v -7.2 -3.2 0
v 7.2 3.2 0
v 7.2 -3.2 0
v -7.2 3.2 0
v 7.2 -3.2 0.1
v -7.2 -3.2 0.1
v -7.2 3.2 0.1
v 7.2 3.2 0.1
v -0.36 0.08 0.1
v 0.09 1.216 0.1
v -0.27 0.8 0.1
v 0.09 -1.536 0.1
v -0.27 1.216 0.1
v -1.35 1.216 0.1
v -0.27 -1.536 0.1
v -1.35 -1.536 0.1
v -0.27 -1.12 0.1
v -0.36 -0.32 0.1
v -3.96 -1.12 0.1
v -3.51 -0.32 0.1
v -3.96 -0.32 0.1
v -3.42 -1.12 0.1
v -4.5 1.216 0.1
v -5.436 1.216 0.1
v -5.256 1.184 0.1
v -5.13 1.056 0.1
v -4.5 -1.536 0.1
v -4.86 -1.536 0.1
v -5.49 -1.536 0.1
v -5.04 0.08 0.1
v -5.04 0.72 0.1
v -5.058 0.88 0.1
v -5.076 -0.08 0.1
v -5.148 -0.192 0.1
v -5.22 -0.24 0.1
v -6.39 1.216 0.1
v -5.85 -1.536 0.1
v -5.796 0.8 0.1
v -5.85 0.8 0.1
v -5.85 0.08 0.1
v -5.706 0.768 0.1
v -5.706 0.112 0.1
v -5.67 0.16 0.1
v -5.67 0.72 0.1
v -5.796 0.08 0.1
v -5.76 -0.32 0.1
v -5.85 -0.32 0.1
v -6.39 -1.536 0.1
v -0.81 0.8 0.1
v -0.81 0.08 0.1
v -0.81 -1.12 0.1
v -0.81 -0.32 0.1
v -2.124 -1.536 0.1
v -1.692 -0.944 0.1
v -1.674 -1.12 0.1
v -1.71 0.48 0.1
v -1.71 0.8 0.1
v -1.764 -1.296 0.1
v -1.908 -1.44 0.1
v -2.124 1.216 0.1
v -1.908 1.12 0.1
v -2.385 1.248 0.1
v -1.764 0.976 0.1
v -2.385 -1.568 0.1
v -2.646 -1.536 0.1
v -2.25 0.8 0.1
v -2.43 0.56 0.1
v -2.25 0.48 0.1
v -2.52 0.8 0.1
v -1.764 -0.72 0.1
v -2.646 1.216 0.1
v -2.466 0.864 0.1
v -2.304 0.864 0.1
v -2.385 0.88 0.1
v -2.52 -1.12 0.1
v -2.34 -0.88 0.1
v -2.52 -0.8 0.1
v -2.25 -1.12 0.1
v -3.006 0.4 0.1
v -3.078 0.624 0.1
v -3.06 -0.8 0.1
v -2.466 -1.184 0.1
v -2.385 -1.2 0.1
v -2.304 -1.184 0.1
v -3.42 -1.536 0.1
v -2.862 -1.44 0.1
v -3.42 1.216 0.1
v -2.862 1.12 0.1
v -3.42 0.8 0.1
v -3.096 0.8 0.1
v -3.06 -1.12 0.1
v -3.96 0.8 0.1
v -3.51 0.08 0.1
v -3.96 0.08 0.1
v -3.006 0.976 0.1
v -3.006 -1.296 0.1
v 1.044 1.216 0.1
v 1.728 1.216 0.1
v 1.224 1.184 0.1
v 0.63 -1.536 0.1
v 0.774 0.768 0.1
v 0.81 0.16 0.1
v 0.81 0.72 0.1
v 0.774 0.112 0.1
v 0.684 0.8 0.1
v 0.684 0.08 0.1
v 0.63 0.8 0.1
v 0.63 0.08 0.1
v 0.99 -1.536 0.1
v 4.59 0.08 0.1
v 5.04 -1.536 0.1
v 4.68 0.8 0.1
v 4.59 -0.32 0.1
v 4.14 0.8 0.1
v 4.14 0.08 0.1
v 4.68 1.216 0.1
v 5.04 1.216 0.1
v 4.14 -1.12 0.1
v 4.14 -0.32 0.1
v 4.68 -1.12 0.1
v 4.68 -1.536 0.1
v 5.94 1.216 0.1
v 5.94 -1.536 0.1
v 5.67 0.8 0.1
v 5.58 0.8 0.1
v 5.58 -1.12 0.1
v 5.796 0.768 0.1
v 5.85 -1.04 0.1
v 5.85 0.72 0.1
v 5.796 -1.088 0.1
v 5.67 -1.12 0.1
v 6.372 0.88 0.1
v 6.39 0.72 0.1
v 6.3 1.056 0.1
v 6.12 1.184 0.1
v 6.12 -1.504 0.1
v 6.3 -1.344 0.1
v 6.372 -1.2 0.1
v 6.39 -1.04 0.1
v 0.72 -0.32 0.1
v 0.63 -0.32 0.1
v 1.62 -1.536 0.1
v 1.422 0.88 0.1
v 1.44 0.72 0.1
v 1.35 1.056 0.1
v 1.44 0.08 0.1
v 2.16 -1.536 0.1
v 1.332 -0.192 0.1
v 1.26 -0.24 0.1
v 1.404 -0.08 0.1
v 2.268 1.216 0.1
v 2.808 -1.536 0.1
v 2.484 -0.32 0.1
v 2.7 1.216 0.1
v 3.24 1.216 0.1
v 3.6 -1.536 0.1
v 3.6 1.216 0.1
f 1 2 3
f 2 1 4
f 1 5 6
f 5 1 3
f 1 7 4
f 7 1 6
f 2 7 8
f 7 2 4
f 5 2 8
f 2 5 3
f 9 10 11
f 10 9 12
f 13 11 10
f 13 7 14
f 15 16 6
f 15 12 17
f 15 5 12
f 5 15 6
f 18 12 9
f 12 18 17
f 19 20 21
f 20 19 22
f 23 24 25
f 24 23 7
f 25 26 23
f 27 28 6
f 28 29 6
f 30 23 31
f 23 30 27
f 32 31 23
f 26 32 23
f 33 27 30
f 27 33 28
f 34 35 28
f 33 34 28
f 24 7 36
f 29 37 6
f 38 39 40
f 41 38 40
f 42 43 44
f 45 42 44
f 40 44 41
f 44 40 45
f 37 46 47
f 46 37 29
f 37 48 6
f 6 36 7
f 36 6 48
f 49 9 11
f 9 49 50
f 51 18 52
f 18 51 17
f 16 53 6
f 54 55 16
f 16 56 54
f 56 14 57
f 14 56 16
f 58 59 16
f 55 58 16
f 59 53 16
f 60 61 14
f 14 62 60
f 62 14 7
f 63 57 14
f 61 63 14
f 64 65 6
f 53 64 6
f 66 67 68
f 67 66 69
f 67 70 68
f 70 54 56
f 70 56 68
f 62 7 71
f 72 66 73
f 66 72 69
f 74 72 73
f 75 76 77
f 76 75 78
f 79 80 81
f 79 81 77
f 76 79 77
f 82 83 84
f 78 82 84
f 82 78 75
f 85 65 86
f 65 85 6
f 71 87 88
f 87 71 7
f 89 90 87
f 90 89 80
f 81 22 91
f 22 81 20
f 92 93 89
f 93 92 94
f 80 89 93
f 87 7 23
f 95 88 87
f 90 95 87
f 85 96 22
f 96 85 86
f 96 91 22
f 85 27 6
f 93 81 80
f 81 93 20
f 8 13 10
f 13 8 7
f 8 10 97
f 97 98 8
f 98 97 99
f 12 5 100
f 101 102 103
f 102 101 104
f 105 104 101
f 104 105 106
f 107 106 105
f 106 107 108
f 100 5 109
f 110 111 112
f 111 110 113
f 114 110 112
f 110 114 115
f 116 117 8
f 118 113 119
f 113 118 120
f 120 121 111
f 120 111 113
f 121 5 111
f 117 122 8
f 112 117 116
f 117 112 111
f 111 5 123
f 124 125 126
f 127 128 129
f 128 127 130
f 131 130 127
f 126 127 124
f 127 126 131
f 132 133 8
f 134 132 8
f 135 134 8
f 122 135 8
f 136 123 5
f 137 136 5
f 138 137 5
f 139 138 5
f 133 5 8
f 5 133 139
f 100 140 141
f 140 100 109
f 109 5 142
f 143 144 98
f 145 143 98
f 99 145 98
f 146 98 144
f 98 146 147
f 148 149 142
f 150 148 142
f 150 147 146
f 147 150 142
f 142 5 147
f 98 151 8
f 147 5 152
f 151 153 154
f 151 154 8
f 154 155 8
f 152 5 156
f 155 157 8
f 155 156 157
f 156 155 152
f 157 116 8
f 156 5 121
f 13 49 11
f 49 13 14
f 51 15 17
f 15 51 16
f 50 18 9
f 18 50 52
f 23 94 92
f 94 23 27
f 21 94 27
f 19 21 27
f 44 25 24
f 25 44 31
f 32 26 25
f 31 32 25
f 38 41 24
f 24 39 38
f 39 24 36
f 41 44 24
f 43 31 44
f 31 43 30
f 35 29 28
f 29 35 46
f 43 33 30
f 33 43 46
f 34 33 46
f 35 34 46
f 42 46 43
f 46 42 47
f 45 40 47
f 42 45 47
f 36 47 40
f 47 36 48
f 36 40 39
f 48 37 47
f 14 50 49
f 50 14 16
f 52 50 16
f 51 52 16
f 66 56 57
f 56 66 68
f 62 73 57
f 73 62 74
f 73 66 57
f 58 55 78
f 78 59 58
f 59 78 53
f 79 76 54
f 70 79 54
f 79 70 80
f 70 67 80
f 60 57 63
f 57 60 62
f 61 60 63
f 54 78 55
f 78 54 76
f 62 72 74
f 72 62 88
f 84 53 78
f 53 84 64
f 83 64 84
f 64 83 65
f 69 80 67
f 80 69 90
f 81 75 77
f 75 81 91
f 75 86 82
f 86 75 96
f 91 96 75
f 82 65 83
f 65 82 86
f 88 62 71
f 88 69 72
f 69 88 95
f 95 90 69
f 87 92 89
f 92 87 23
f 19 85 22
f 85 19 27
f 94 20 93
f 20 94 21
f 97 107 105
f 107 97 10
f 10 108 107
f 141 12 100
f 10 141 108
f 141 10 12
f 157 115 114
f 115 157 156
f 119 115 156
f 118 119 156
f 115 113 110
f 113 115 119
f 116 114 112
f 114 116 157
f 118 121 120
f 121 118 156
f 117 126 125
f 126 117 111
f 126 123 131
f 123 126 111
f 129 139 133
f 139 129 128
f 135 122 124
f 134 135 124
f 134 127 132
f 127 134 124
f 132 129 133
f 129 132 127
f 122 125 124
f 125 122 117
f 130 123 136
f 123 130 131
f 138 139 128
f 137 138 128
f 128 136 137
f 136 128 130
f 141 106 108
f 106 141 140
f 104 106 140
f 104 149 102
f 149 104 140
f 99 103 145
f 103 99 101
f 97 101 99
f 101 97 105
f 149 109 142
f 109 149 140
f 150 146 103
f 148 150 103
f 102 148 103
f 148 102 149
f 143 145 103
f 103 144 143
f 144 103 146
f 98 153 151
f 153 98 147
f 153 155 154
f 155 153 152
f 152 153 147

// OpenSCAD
// file: ../p/box5-12.scad
use <../lib.scad>
function ldraw_lib__box5_12() = [
// 0 Box with 5 Faces without Any Edges
// 0 Name: box5-12.dat
// 0 Author: Chris Dee [cwdee]
// 0 !LDRAW_ORG Primitive UPDATE 2009-02
// 0 !LICENSE Licensed under CC BY 4.0 : see CAreadme.txt
// 
// 0 BFC CERTIFY CCW
  [0,"BFC","CERTIFY"],
  [0,"BFC","CCW"],
// 
// 0 !HISTORY 2009-09-03 [PTadmin] Official Update 2009-02
// 
// 
// 4 16 1 1 1 1 1 -1 -1 1 -1 -1 1 1
  [4,16,1,1,1,1,1,-1,-1,1,-1,-1,1,1],
// 4 16 -1 0 1 1 0 1 1 1 1 -1 1 1
  [4,16,-1,0,1,1,0,1,1,1,1,-1,1,1],
// 4 16 -1 0 -1 -1 0 1 -1 1 1 -1 1 -1
  [4,16,-1,0,-1,-1,0,1,-1,1,1,-1,1,-1],
// 4 16 1 0 -1 -1 0 -1 -1 1 -1 1 1 -1
  [4,16,1,0,-1,-1,0,-1,-1,1,-1,1,1,-1],
// 4 16 1 0 1 1 0 -1 1 1 -1 1 1 1
  [4,16,1,0,1,1,0,-1,1,1,-1,1,1,1],
// 0
];
module ldraw_lib__box5_12(step=0, col=false, unit=2/5, alt=false, line=0.2, solid=!$preview)
    makepoly(ldraw_lib__box5_12(), step=step, col=col, unit=unit, alt=alt, line=line, solid=solid);
ldraw_lib__box5_12(line=0.2);
// main file
use <../lib.scad>
use <../p/box5-12.scad>
function ldraw_lib__6288456d() = [
// 0 Sticker  0.8 x  1.8 with White "RESERVED" on Black Background
// 0 Name: 6288456d.dat
// 0 Author: Vincent Messenet [Cheenzo]
// 0 !LDRAW_ORG Part UPDATE 2020-01
// 0 !LICENSE Licensed under CC BY 4.0 : see CAreadme.txt
// 
// 0 BFC CERTIFY CCW
  [0,"BFC","CERTIFY"],
  [0,"BFC","CCW"],
// 
// 0 !KEYWORDS Central Perk, Friends, Set 21319
// 
// 0 !HISTORY 2020-06-28 [PTadmin] Official Update 2020-01
// 
// 
// 1 16 0 -0.25 0 18 0 0 0 0.25 0 0 0 -8 box5-12.dat
  [1,16,0,-0.25,0,18,0,0,0,0.25,0,0,0,-8, ldraw_lib__box5_12()],
// 
// 4 0 .225 -.25 -3.84 .225 -.25 3.04 -.675 -.25 2 -.9 -.25 .2
  [4,0,.225,-.25,-3.84,.225,-.25,3.04,-.675,-.25,2,-.9,-.25,.2],
// 3 0 -.675 -.25 3.04 -.675 -.25 2 .225 -.25 3.04
  [3,0,-.675,-.25,3.04,-.675,-.25,2,.225,-.25,3.04],
// 3 0 -.675 -.25 3.04 -18 -.25 8 -3.375 -.25 3.04
  [3,0,-.675,-.25,3.04,-18,-.25,8,-3.375,-.25,3.04],
// 3 0 -.675 -.25 -3.84 -3.375 -.25 -3.84 -18 -.25 -8
  [3,0,-.675,-.25,-3.84,-3.375,-.25,-3.84,-18,-.25,-8],
// 3 0 -.675 -.25 -3.84 .225 -.25 -3.84 -.675 -.25 -2.8
  [3,0,-.675,-.25,-3.84,.225,-.25,-3.84,-.675,-.25,-2.8],
// 4 0 -18 -.25 -8 18 -.25 -8 .225 -.25 -3.84 -.675 -.25 -3.84
  [4,0,-18,-.25,-8,18,-.25,-8,.225,-.25,-3.84,-.675,-.25,-3.84],
// 4 0 -.675 -.25 -2.8 .225 -.25 -3.84 -.9 -.25 .2 -.9 -.25 -.8
  [4,0,-.675,-.25,-2.8,.225,-.25,-3.84,-.9,-.25,.2,-.9,-.25,-.8],
// 4 0 -8.55 -.25 -2.8 -8.775 -.25 -.8 -9.9 -.25 -.8 -9.9 -.25 -2.8
  [4,0,-8.55,-.25,-2.8,-8.775,-.25,-.8,-9.9,-.25,-.8,-9.9,-.25,-2.8],
// 4 0 -13.59 -.25 3.04 -13.14 -.25 2.96 -11.25 -.25 3.04 -18 -.25 8
  [4,0,-13.59,-.25,3.04,-13.14,-.25,2.96,-11.25,-.25,3.04,-18,-.25,8],
// 3 0 -13.14 -.25 2.96 -12.825 -.25 2.64 -11.25 -.25 3.04
  [3,0,-13.14,-.25,2.96,-12.825,-.25,2.64,-11.25,-.25,3.04],
// 3 0 -11.25 -.25 -3.84 -12.15 -.25 -3.84 -18 -.25 -8
  [3,0,-11.25,-.25,-3.84,-12.15,-.25,-3.84,-18,-.25,-8],
// 3 0 -12.15 -.25 -3.84 -13.725 -.25 -3.84 -18 -.25 -8
  [3,0,-12.15,-.25,-3.84,-13.725,-.25,-3.84,-18,-.25,-8],
// 4 0 -12.6 -.25 .2 -11.25 -.25 -3.84 -11.25 -.25 3.04 -12.6 -.25 1.8
  [4,0,-12.6,-.25,.2,-11.25,-.25,-3.84,-11.25,-.25,3.04,-12.6,-.25,1.8],
// 3 0 -12.645 -.25 2.2 -12.6 -.25 1.8 -11.25 -.25 3.04
  [3,0,-12.645,-.25,2.2,-12.6,-.25,1.8,-11.25,-.25,3.04],
// 3 0 -12.825 -.25 2.64 -12.645 -.25 2.2 -11.25 -.25 3.04
  [3,0,-12.825,-.25,2.64,-12.645,-.25,2.2,-11.25,-.25,3.04],
// 4 0 -12.15 -.25 -3.84 -11.25 -.25 -3.84 -12.6 -.25 .2 -12.69 -.25 -.2
  [4,0,-12.15,-.25,-3.84,-11.25,-.25,-3.84,-12.6,-.25,.2,-12.69,-.25,-.2],
// 3 0 -12.87 -.25 -.48 -13.05 -.25 -.6 -12.15 -.25 -3.84
  [3,0,-12.87,-.25,-.48,-13.05,-.25,-.6,-12.15,-.25,-3.84],
// 3 0 -12.69 -.25 -.2 -12.87 -.25 -.48 -12.15 -.25 -3.84
  [3,0,-12.69,-.25,-.2,-12.87,-.25,-.48,-12.15,-.25,-3.84],
// 3 0 -13.59 -.25 3.04 -18 -.25 8 -15.975 -.25 3.04
  [3,0,-13.59,-.25,3.04,-18,-.25,8,-15.975,-.25,3.04],
// 3 0 -13.725 -.25 -3.84 -14.625 -.25 -3.84 -18 -.25 -8
  [3,0,-13.725,-.25,-3.84,-14.625,-.25,-3.84,-18,-.25,-8],
// 3 0 -14.49 -.25 2 -14.625 -.25 2 -14.625 -.25 .2
  [3,0,-14.49,-.25,2,-14.625,-.25,2,-14.625,-.25,.2],
// 3 0 -14.265 -.25 1.92 -14.49 -.25 2 -14.625 -.25 .2
  [3,0,-14.265,-.25,1.92,-14.49,-.25,2,-14.625,-.25,.2],
// 3 0 -14.265 -.25 .28 -14.175 -.25 .4 -14.175 -.25 1.8
  [3,0,-14.265,-.25,.28,-14.175,-.25,.4,-14.175,-.25,1.8],
// 3 0 -14.49 -.25 .2 -14.265 -.25 .28 -14.175 -.25 1.8
  [3,0,-14.49,-.25,.2,-14.265,-.25,.28,-14.175,-.25,1.8],
// 4 0 -14.175 -.25 1.8 -14.265 -.25 1.92 -14.625 -.25 .2 -14.49 -.25 .2
  [4,0,-14.175,-.25,1.8,-14.265,-.25,1.92,-14.625,-.25,.2,-14.49,-.25,.2],
// 4 0 -14.4 -.25 -.8 -14.625 -.25 -.8 -14.625 -.25 -3.84 -13.725 -.25 -3.84
  [4,0,-14.4,-.25,-.8,-14.625,-.25,-.8,-14.625,-.25,-3.84,-13.725,-.25,-3.84],
// 3 0 -14.625 -.25 -3.84 -15.975 -.25 -3.84 -18 -.25 -8
  [3,0,-14.625,-.25,-3.84,-15.975,-.25,-3.84,-18,-.25,-8],
// 4 0 -18 -.25 8 -18 -.25 -8 -15.975 -.25 -3.84 -15.975 -.25 3.04
  [4,0,-18,-.25,8,-18,-.25,-8,-15.975,-.25,-3.84,-15.975,-.25,3.04],
// 4 0 -.675 -.25 2 -2.025 -.25 2 -2.025 -.25 .2 -.9 -.25 .2
  [4,0,-.675,-.25,2,-2.025,-.25,2,-2.025,-.25,.2,-.9,-.25,.2],
// 4 0 -.675 -.25 -2.8 -.9 -.25 -.8 -2.025 -.25 -.8 -2.025 -.25 -2.8
  [4,0,-.675,-.25,-2.8,-.9,-.25,-.8,-2.025,-.25,-.8,-2.025,-.25,-2.8],
// 3 0 -3.375 -.25 -3.84 -5.31 -.25 -3.84 -18 -.25 -8
  [3,0,-3.375,-.25,-3.84,-5.31,-.25,-3.84,-18,-.25,-8],
// 3 0 -4.23 -.25 -2.36 -4.185 -.25 -2.8 -3.375 -.25 -3.84
  [3,0,-4.23,-.25,-2.36,-4.185,-.25,-2.8,-3.375,-.25,-3.84],
// 3 0 -3.375 -.25 -3.84 -4.275 -.25 1.2 -4.23 -.25 -2.36
  [3,0,-3.375,-.25,-3.84,-4.275,-.25,1.2,-4.23,-.25,-2.36],
// 4 0 -4.275 -.25 1.2 -3.375 -.25 -3.84 -3.375 -.25 3.04 -4.275 -.25 2
  [4,0,-4.275,-.25,1.2,-3.375,-.25,-3.84,-3.375,-.25,3.04,-4.275,-.25,2],
// 3 0 -4.41 -.25 -3.24 -4.77 -.25 -3.6 -3.375 -.25 -3.84
  [3,0,-4.41,-.25,-3.24,-4.77,-.25,-3.6,-3.375,-.25,-3.84],
// 3 0 -4.185 -.25 -2.8 -4.41 -.25 -3.24 -3.375 -.25 -3.84
  [3,0,-4.185,-.25,-2.8,-4.41,-.25,-3.24,-3.375,-.25,-3.84],
// 3 0 -4.77 -.25 -3.6 -5.31 -.25 -3.84 -3.375 -.25 -3.84
  [3,0,-4.77,-.25,-3.6,-5.31,-.25,-3.84,-3.375,-.25,-3.84],
// 3 0 -5.31 -.25 3.04 -4.77 -.25 2.8 -3.375 -.25 3.04
  [3,0,-5.31,-.25,3.04,-4.77,-.25,2.8,-3.375,-.25,3.04],
// 4 0 -3.375 -.25 3.04 -18 -.25 8 -5.9625 -.25 3.12 -5.31 -.25 3.04
  [4,0,-3.375,-.25,3.04,-18,-.25,8,-5.9625,-.25,3.12,-5.31,-.25,3.04],
// 3 0 -4.41 -.25 2.44 -4.275 -.25 2 -3.375 -.25 3.04
  [3,0,-4.41,-.25,2.44,-4.275,-.25,2,-3.375,-.25,3.04],
// 3 0 -4.77 -.25 2.8 -4.41 -.25 2.44 -3.375 -.25 3.04
  [3,0,-4.77,-.25,2.8,-4.41,-.25,2.44,-3.375,-.25,3.04],
// 3 0 -5.9625 -.25 -3.92 -6.615 -.25 -3.84 -18 -.25 -8
  [3,0,-5.9625,-.25,-3.92,-6.615,-.25,-3.84,-18,-.25,-8],
// 3 0 -5.31 -.25 -3.84 -5.9625 -.25 -3.92 -18 -.25 -8
  [3,0,-5.31,-.25,-3.84,-5.9625,-.25,-3.92,-18,-.25,-8],
// 4 0 -6.075 -.25 1.4 -5.625 -.25 1.2 -5.625 -.25 2 -6.3 -.25 2
  [4,0,-6.075,-.25,1.4,-5.625,-.25,1.2,-5.625,-.25,2,-6.3,-.25,2],
// 3 0 -6.075 -.25 1.4 -4.41 -.25 -1.8 -5.625 -.25 1.2
  [3,0,-6.075,-.25,1.4,-4.41,-.25,-1.8,-5.625,-.25,1.2],
// 3 0 -4.41 -.25 -1.8 -4.23 -.25 -2.36 -4.275 -.25 1.2
  [3,0,-4.41,-.25,-1.8,-4.23,-.25,-2.36,-4.275,-.25,1.2],
// 3 0 -4.41 -.25 -1.8 -4.275 -.25 1.2 -5.625 -.25 1.2
  [3,0,-4.41,-.25,-1.8,-4.275,-.25,1.2,-5.625,-.25,1.2],
// 3 0 -5.9625 -.25 3.12 -18 -.25 8 -6.615 -.25 3.04
  [3,0,-5.9625,-.25,3.12,-18,-.25,8,-6.615,-.25,3.04],
// 4 0 -5.625 -.25 2 -5.76 -.25 2.16 -6.165 -.25 2.16 -6.3 -.25 2
  [4,0,-5.625,-.25,2,-5.76,-.25,2.16,-6.165,-.25,2.16,-6.3,-.25,2],
// 3 0 -5.9625 -.25 2.2 -6.165 -.25 2.16 -5.76 -.25 2.16
  [3,0,-5.9625,-.25,2.2,-6.165,-.25,2.16,-5.76,-.25,2.16],
// 4 0 -5.625 -.25 -2.8 -5.85 -.25 -2.2 -6.3 -.25 -2 -6.3 -.25 -2.8
  [4,0,-5.625,-.25,-2.8,-5.85,-.25,-2.2,-6.3,-.25,-2,-6.3,-.25,-2.8],
// 3 0 -7.515 -.25 1 -7.695 -.25 1.56 -7.65 -.25 -2
  [3,0,-7.515,-.25,1,-7.695,-.25,1.56,-7.65,-.25,-2],
// 3 0 -7.515 -.25 1 -7.65 -.25 -2 -6.3 -.25 -2
  [3,0,-7.515,-.25,1,-7.65,-.25,-2,-6.3,-.25,-2],
// 3 0 -5.85 -.25 -2.2 -7.515 -.25 1 -6.3 -.25 -2
  [3,0,-5.85,-.25,-2.2,-7.515,-.25,1,-6.3,-.25,-2],
// 3 0 -6.165 -.25 -2.96 -5.9625 -.25 -3 -5.76 -.25 -2.96
  [3,0,-6.165,-.25,-2.96,-5.9625,-.25,-3,-5.76,-.25,-2.96],
// 4 0 -5.625 -.25 -2.8 -6.3 -.25 -2.8 -6.165 -.25 -2.96 -5.76 -.25 -2.96
  [4,0,-5.625,-.25,-2.8,-6.3,-.25,-2.8,-6.165,-.25,-2.96,-5.76,-.25,-2.96],
// 4 0 -7.155 -.25 -3.6 -8.55 -.25 -3.84 -18 -.25 -8 -6.615 -.25 -3.84
  [4,0,-7.155,-.25,-3.6,-8.55,-.25,-3.84,-18,-.25,-8,-6.615,-.25,-3.84],
// 4 0 -18 -.25 8 -8.55 -.25 3.04 -7.155 -.25 2.8 -6.615 -.25 3.04
  [4,0,-18,-.25,8,-8.55,-.25,3.04,-7.155,-.25,2.8,-6.615,-.25,3.04],
// 4 0 -8.55 -.25 3.04 -8.55 -.25 2 -7.695 -.25 1.56 -7.74 -.25 2
  [4,0,-8.55,-.25,3.04,-8.55,-.25,2,-7.695,-.25,1.56,-7.74,-.25,2],
// 4 0 -8.775 -.25 -.8 -8.55 -.25 -2.8 -7.65 -.25 -2.8 -7.65 -.25 -2
  [4,0,-8.775,-.25,-.8,-8.55,-.25,-2.8,-7.65,-.25,-2.8,-7.65,-.25,-2],
// 4 0 -9.9 -.25 .2 -8.775 -.25 .2 -8.55 -.25 2 -9.9 -.25 2
  [4,0,-9.9,-.25,.2,-8.775,-.25,.2,-8.55,-.25,2,-9.9,-.25,2],
// 3 0 -7.695 -.25 1.56 -8.55 -.25 2 -8.775 -.25 .2
  [3,0,-7.695,-.25,1.56,-8.55,-.25,2,-8.775,-.25,.2],
// 3 0 -8.55 -.25 3.04 -18 -.25 8 -11.25 -.25 3.04
  [3,0,-8.55,-.25,3.04,-18,-.25,8,-11.25,-.25,3.04],
// 3 0 -7.515 -.25 2.44 -7.155 -.25 2.8 -8.55 -.25 3.04
  [3,0,-7.515,-.25,2.44,-7.155,-.25,2.8,-8.55,-.25,3.04],
// 3 0 -7.74 -.25 2 -7.515 -.25 2.44 -8.55 -.25 3.04
  [3,0,-7.74,-.25,2,-7.515,-.25,2.44,-8.55,-.25,3.04],
// 4 0 -7.155 -.25 -3.6 -7.515 -.25 -3.24 -8.55 -.25 -2.8 -8.55 -.25 -3.84
  [4,0,-7.155,-.25,-3.6,-7.515,-.25,-3.24,-8.55,-.25,-2.8,-8.55,-.25,-3.84],
// 3 0 -7.515 -.25 -3.24 -7.65 -.25 -2.8 -8.55 -.25 -2.8
  [3,0,-7.515,-.25,-3.24,-7.65,-.25,-2.8,-8.55,-.25,-2.8],
// 3 0 -8.55 -.25 -3.84 -11.25 -.25 -3.84 -18 -.25 -8
  [3,0,-8.55,-.25,-3.84,-11.25,-.25,-3.84,-18,-.25,-8],
// 4 0 -7.65 -.25 -2 -7.695 -.25 1.56 -8.775 -.25 .2 -8.775 -.25 -.8
  [4,0,-7.65,-.25,-2,-7.695,-.25,1.56,-8.775,-.25,.2,-8.775,-.25,-.8],
// 4 0 -.675 -.25 3.04 .225 -.25 3.04 18 -.25 8 -18 -.25 8
  [4,0,-.675,-.25,3.04,.225,-.25,3.04,18,-.25,8,-18,-.25,8],
// 3 0 18 -.25 8 .225 -.25 3.04 2.61 -.25 3.04
  [3,0,18,-.25,8,.225,-.25,3.04,2.61,-.25,3.04],
// 4 0 3.06 -.25 2.96 4.32 -.25 3.04 18 -.25 8 2.61 -.25 3.04
  [4,0,3.06,-.25,2.96,4.32,-.25,3.04,18,-.25,8,2.61,-.25,3.04],
// 3 0 .225 -.25 -3.84 18 -.25 -8 1.575 -.25 -3.84
  [3,0,.225,-.25,-3.84,18,-.25,-8,1.575,-.25,-3.84],
// 4 0 2.025 -.25 1.8 1.935 -.25 1.92 1.935 -.25 .28 2.025 -.25 .4
  [4,0,2.025,-.25,1.8,1.935,-.25,1.92,1.935,-.25,.28,2.025,-.25,.4],
// 4 0 1.71 -.25 2 1.71 -.25 .2 1.935 -.25 .28 1.935 -.25 1.92
  [4,0,1.71,-.25,2,1.71,-.25,.2,1.935,-.25,.28,1.935,-.25,1.92],
// 4 0 1.575 -.25 2 1.575 -.25 .2 1.71 -.25 .2 1.71 -.25 2
  [4,0,1.575,-.25,2,1.575,-.25,.2,1.71,-.25,.2,1.71,-.25,2],
// 3 0 1.575 -.25 -3.84 18 -.25 -8 2.475 -.25 -3.84
  [3,0,1.575,-.25,-3.84,18,-.25,-8,2.475,-.25,-3.84],
// 4 0 11.475 -.25 -.8 12.6 -.25 -3.84 11.7 -.25 2 11.475 -.25 .2
  [4,0,11.475,-.25,-.8,12.6,-.25,-3.84,11.7,-.25,2,11.475,-.25,.2],
// 4 0 10.35 -.25 .2 11.475 -.25 .2 11.7 -.25 2 10.35 -.25 2
  [4,0,10.35,-.25,.2,11.475,-.25,.2,11.7,-.25,2,10.35,-.25,2],
// 3 0 11.7 -.25 3.04 12.6 -.25 3.04 18 -.25 8
  [3,0,11.7,-.25,3.04,12.6,-.25,3.04,18,-.25,8],
// 4 0 10.35 -.25 -.8 10.35 -.25 -2.8 11.7 -.25 -2.8 11.475 -.25 -.8
  [4,0,10.35,-.25,-.8,10.35,-.25,-2.8,11.7,-.25,-2.8,11.475,-.25,-.8],
// 3 0 11.7 -.25 -2.8 11.7 -.25 -3.84 12.6 -.25 -3.84
  [3,0,11.7,-.25,-2.8,11.7,-.25,-3.84,12.6,-.25,-3.84],
// 3 0 11.7 -.25 -2.8 12.6 -.25 -3.84 11.475 -.25 -.8
  [3,0,11.7,-.25,-2.8,12.6,-.25,-3.84,11.475,-.25,-.8],
// 3 0 11.7 -.25 -3.84 18 -.25 -8 12.6 -.25 -3.84
  [3,0,11.7,-.25,-3.84,18,-.25,-8,12.6,-.25,-3.84],
// 3 0 12.6 -.25 3.04 14.85 -.25 3.04 18 -.25 8
  [3,0,12.6,-.25,3.04,14.85,-.25,3.04,18,-.25,8],
// 4 0 11.7 -.25 2 12.6 -.25 -3.84 12.6 -.25 3.04 11.7 -.25 3.04
  [4,0,11.7,-.25,2,12.6,-.25,-3.84,12.6,-.25,3.04,11.7,-.25,3.04],
// 3 0 12.6 -.25 -3.84 18 -.25 -8 14.85 -.25 -3.84
  [3,0,12.6,-.25,-3.84,18,-.25,-8,14.85,-.25,-3.84],
// 3 0 14.175 -.25 2 13.95 -.25 2 13.95 -.25 -2.8
  [3,0,14.175,-.25,2,13.95,-.25,2,13.95,-.25,-2.8],
// 4 0 14.625 -.25 1.8 14.49 -.25 1.92 14.49 -.25 -2.72 14.625 -.25 -2.6
  [4,0,14.625,-.25,1.8,14.49,-.25,1.92,14.49,-.25,-2.72,14.625,-.25,-2.6],
// 3 0 14.175 -.25 -2.8 14.49 -.25 -2.72 14.49 -.25 1.92
  [3,0,14.175,-.25,-2.8,14.49,-.25,-2.72,14.49,-.25,1.92],
// 4 0 14.49 -.25 1.92 14.175 -.25 2 13.95 -.25 -2.8 14.175 -.25 -2.8
  [4,0,14.49,-.25,1.92,14.175,-.25,2,13.95,-.25,-2.8,14.175,-.25,-2.8],
// 3 0 15.93 -.25 2.2 15.975 -.25 1.8 18 -.25 8
  [3,0,15.93,-.25,2.2,15.975,-.25,1.8,18,-.25,8],
// 3 0 15.75 -.25 2.64 15.93 -.25 2.2 18 -.25 8
  [3,0,15.75,-.25,2.64,15.93,-.25,2.2,18,-.25,8],
// 3 0 15.3 -.25 2.96 15.75 -.25 2.64 18 -.25 8
  [3,0,15.3,-.25,2.96,15.75,-.25,2.64,18,-.25,8],
// 3 0 14.85 -.25 3.04 15.3 -.25 2.96 18 -.25 8
  [3,0,14.85,-.25,3.04,15.3,-.25,2.96,18,-.25,8],
// 3 0 15.3 -.25 -3.76 14.85 -.25 -3.84 18 -.25 -8
  [3,0,15.3,-.25,-3.76,14.85,-.25,-3.84,18,-.25,-8],
// 3 0 15.75 -.25 -3.36 15.3 -.25 -3.76 18 -.25 -8
  [3,0,15.75,-.25,-3.36,15.3,-.25,-3.76,18,-.25,-8],
// 3 0 15.93 -.25 -3 15.75 -.25 -3.36 18 -.25 -8
  [3,0,15.93,-.25,-3,15.75,-.25,-3.36,18,-.25,-8],
// 3 0 15.975 -.25 -2.6 15.93 -.25 -3 18 -.25 -8
  [3,0,15.975,-.25,-2.6,15.93,-.25,-3,18,-.25,-8],
// 4 0 15.975 -.25 -2.6 18 -.25 -8 18 -.25 8 15.975 -.25 1.8
  [4,0,15.975,-.25,-2.6,18,-.25,-8,18,-.25,8,15.975,-.25,1.8],
// 4 0 1.575 -.25 -3.84 2.475 -.25 -3.84 1.8 -.25 -.8 1.575 -.25 -.8
  [4,0,1.575,-.25,-3.84,2.475,-.25,-3.84,1.8,-.25,-.8,1.575,-.25,-.8],
// 3 0 2.475 -.25 -3.84 18 -.25 -8 4.05 -.25 -3.84
  [3,0,2.475,-.25,-3.84,18,-.25,-8,4.05,-.25,-3.84],
// 3 0 3.555 -.25 2.2 3.6 -.25 1.8 4.32 -.25 3.04
  [3,0,3.555,-.25,2.2,3.6,-.25,1.8,4.32,-.25,3.04],
// 3 0 3.375 -.25 2.64 3.555 -.25 2.2 4.32 -.25 3.04
  [3,0,3.375,-.25,2.64,3.555,-.25,2.2,4.32,-.25,3.04],
// 3 0 3.06 -.25 2.96 3.375 -.25 2.64 4.32 -.25 3.04
  [3,0,3.06,-.25,2.96,3.375,-.25,2.64,4.32,-.25,3.04],
// 4 0 5.4 -.25 -3.84 4.32 -.25 3.04 3.6 -.25 1.8 3.6 -.25 .2
  [4,0,5.4,-.25,-3.84,4.32,-.25,3.04,3.6,-.25,1.8,3.6,-.25,.2],
// 3 0 3.33 -.25 -.48 3.15 -.25 -.6 4.05 -.25 -3.84
  [3,0,3.33,-.25,-.48,3.15,-.25,-.6,4.05,-.25,-3.84],
// 3 0 3.51 -.25 -.2 3.33 -.25 -.48 4.05 -.25 -3.84
  [3,0,3.51,-.25,-.2,3.33,-.25,-.48,4.05,-.25,-3.84],
// 4 0 4.05 -.25 -3.84 5.4 -.25 -3.84 3.6 -.25 .2 3.51 -.25 -.2
  [4,0,4.05,-.25,-3.84,5.4,-.25,-3.84,3.6,-.25,.2,3.51,-.25,-.2],
// 3 0 4.05 -.25 -3.84 18 -.25 -8 5.4 -.25 -3.84
  [3,0,4.05,-.25,-3.84,18,-.25,-8,5.4,-.25,-3.84],
// 3 0 4.32 -.25 3.04 5.67 -.25 3.04 18 -.25 8
  [3,0,4.32,-.25,3.04,5.67,-.25,3.04,18,-.25,8],
// 3 0 5.4 -.25 -3.84 18 -.25 -8 7.02 -.25 -3.84
  [3,0,5.4,-.25,-3.84,18,-.25,-8,7.02,-.25,-3.84],
// 3 0 5.67 -.25 3.04 6.21 -.25 -.8 6.75 -.25 3.04
  [3,0,5.67,-.25,3.04,6.21,-.25,-.8,6.75,-.25,3.04],
// 3 0 5.67 -.25 3.04 6.75 -.25 3.04 18 -.25 8
  [3,0,5.67,-.25,3.04,6.75,-.25,3.04,18,-.25,8],
// 3 0 6.75 -.25 3.04 8.1 -.25 3.04 18 -.25 8
  [3,0,6.75,-.25,3.04,8.1,-.25,3.04,18,-.25,8],
// 3 0 7.02 -.25 -3.84 18 -.25 -8 9 -.25 -3.84
  [3,0,7.02,-.25,-3.84,18,-.25,-8,9,-.25,-3.84],
// 3 0 8.1 -.25 3.04 9 -.25 3.04 18 -.25 8
  [3,0,8.1,-.25,3.04,9,-.25,3.04,18,-.25,8],
// 4 0 7.02 -.25 -3.84 9 -.25 -3.84 9 -.25 3.04 8.1 -.25 3.04
  [4,0,7.02,-.25,-3.84,9,-.25,-3.84,9,-.25,3.04,8.1,-.25,3.04],
// 3 0 9 -.25 3.04 11.7 -.25 3.04 18 -.25 8
  [3,0,9,-.25,3.04,11.7,-.25,3.04,18,-.25,8],
// 3 0 9 -.25 -3.84 18 -.25 -8 11.7 -.25 -3.84
  [3,0,9,-.25,-3.84,18,-.25,-8,11.7,-.25,-3.84],
// 4 15 -.675 -.25 2 -.675 -.25 3.04 -3.375 -.25 3.04 -2.025 -.25 2
  [4,15,-.675,-.25,2,-.675,-.25,3.04,-3.375,-.25,3.04,-2.025,-.25,2],
// 4 15 -3.375 -.25 -3.84 -.675 -.25 -3.84 -.675 -.25 -2.8 -2.025 -.25 -2.8
  [4,15,-3.375,-.25,-3.84,-.675,-.25,-3.84,-.675,-.25,-2.8,-2.025,-.25,-2.8],
// 4 15 -2.025 -.25 -.8 -.9 -.25 -.8 -.9 -.25 .2 -2.025 -.25 .2
  [4,15,-2.025,-.25,-.8,-.9,-.25,-.8,-.9,-.25,.2,-2.025,-.25,.2],
// 4 15 -11.25 -.25 3.04 -11.25 -.25 -3.84 -9.9 -.25 .2 -9.9 -.25 2
  [4,15,-11.25,-.25,3.04,-11.25,-.25,-3.84,-9.9,-.25,.2,-9.9,-.25,2],
// 3 15 -9.9 -.25 -.8 -9.9 -.25 .2 -11.25 -.25 -3.84
  [3,15,-9.9,-.25,-.8,-9.9,-.25,.2,-11.25,-.25,-3.84],
// 3 15 -9.9 -.25 -2.8 -9.9 -.25 -.8 -11.25 -.25 -3.84
  [3,15,-9.9,-.25,-2.8,-9.9,-.25,-.8,-11.25,-.25,-3.84],
// 4 15 -12.6 -.25 1.8 -13.14 -.25 2.96 -13.59 -.25 3.04 -14.175 -.25 1.8
  [4,15,-12.6,-.25,1.8,-13.14,-.25,2.96,-13.59,-.25,3.04,-14.175,-.25,1.8],
// 3 15 -12.645 -.25 2.2 -12.825 -.25 2.64 -13.14 -.25 2.96
  [3,15,-12.645,-.25,2.2,-12.825,-.25,2.64,-13.14,-.25,2.96],
// 3 15 -12.6 -.25 1.8 -12.645 -.25 2.2 -13.14 -.25 2.96
  [3,15,-12.6,-.25,1.8,-12.645,-.25,2.2,-13.14,-.25,2.96],
// 3 15 -14.49 -.25 2 -14.265 -.25 1.92 -13.59 -.25 3.04
  [3,15,-14.49,-.25,2,-14.265,-.25,1.92,-13.59,-.25,3.04],
// 4 15 -13.59 -.25 3.04 -15.975 -.25 3.04 -14.625 -.25 2 -14.49 -.25 2
  [4,15,-13.59,-.25,3.04,-15.975,-.25,3.04,-14.625,-.25,2,-14.49,-.25,2],
// 3 15 -14.265 -.25 1.92 -14.175 -.25 1.8 -13.59 -.25 3.04
  [3,15,-14.265,-.25,1.92,-14.175,-.25,1.8,-13.59,-.25,3.04],
// 4 15 -12.6 -.25 1.8 -14.175 -.25 1.8 -14.175 -.25 .4 -12.6 -.25 .2
  [4,15,-12.6,-.25,1.8,-14.175,-.25,1.8,-14.175,-.25,.4,-12.6,-.25,.2],
// 4 15 -12.15 -.25 -3.84 -13.05 -.25 -.6 -14.4 -.25 -.8 -13.725 -.25 -3.84
  [4,15,-12.15,-.25,-3.84,-13.05,-.25,-.6,-14.4,-.25,-.8,-13.725,-.25,-3.84],
// 4 15 -14.4 -.25 -.8 -12.69 -.25 -.2 -12.6 -.25 .2 -14.175 -.25 .4
  [4,15,-14.4,-.25,-.8,-12.69,-.25,-.2,-12.6,-.25,.2,-14.175,-.25,.4],
// 3 15 -12.87 -.25 -.48 -12.69 -.25 -.2 -14.4 -.25 -.8
  [3,15,-12.87,-.25,-.48,-12.69,-.25,-.2,-14.4,-.25,-.8],
// 3 15 -13.05 -.25 -.6 -12.87 -.25 -.48 -14.4 -.25 -.8
  [3,15,-13.05,-.25,-.6,-12.87,-.25,-.48,-14.4,-.25,-.8],
// 4 15 -14.175 -.25 .4 -14.265 -.25 .28 -14.625 -.25 -.8 -14.4 -.25 -.8
  [4,15,-14.175,-.25,.4,-14.265,-.25,.28,-14.625,-.25,-.8,-14.4,-.25,-.8],
// 3 15 -14.49 -.25 .2 -14.625 -.25 .2 -14.625 -.25 -.8
  [3,15,-14.49,-.25,.2,-14.625,-.25,.2,-14.625,-.25,-.8],
// 3 15 -14.265 -.25 .28 -14.49 -.25 .2 -14.625 -.25 -.8
  [3,15,-14.265,-.25,.28,-14.49,-.25,.2,-14.625,-.25,-.8],
// 4 15 -15.975 -.25 3.04 -15.975 -.25 -3.84 -14.625 -.25 -.8 -14.625 -.25 .2
  [4,15,-15.975,-.25,3.04,-15.975,-.25,-3.84,-14.625,-.25,-.8,-14.625,-.25,.2],
// 3 15 -15.975 -.25 3.04 -14.625 -.25 .2 -14.625 -.25 2
  [3,15,-15.975,-.25,3.04,-14.625,-.25,.2,-14.625,-.25,2],
// 3 15 -15.975 -.25 -3.84 -14.625 -.25 -3.84 -14.625 -.25 -.8
  [3,15,-15.975,-.25,-3.84,-14.625,-.25,-3.84,-14.625,-.25,-.8],
// 4 15 -2.025 -.25 .2 -2.025 -.25 2 -3.375 -.25 3.04 -3.375 -.25 -3.84
  [4,15,-2.025,-.25,.2,-2.025,-.25,2,-3.375,-.25,3.04,-3.375,-.25,-3.84],
// 3 15 -2.025 -.25 -.8 -2.025 -.25 .2 -3.375 -.25 -3.84
  [3,15,-2.025,-.25,-.8,-2.025,-.25,.2,-3.375,-.25,-3.84],
// 3 15 -2.025 -.25 -2.8 -2.025 -.25 -.8 -3.375 -.25 -3.84
  [3,15,-2.025,-.25,-2.8,-2.025,-.25,-.8,-3.375,-.25,-3.84],
// 4 15 -5.625 -.25 2 -5.625 -.25 1.2 -4.275 -.25 1.2 -4.275 -.25 2
  [4,15,-5.625,-.25,2,-5.625,-.25,1.2,-4.275,-.25,1.2,-4.275,-.25,2],
// 4 15 -5.9625 -.25 2.2 -5.76 -.25 2.16 -4.275 -.25 2 -5.9625 -.25 3.12
  [4,15,-5.9625,-.25,2.2,-5.76,-.25,2.16,-4.275,-.25,2,-5.9625,-.25,3.12],
// 3 15 -5.76 -.25 2.16 -5.625 -.25 2 -4.275 -.25 2
  [3,15,-5.76,-.25,2.16,-5.625,-.25,2,-4.275,-.25,2],
// 3 15 -4.41 -.25 -3.24 -4.185 -.25 -2.8 -5.625 -.25 -2.8
  [3,15,-4.41,-.25,-3.24,-4.185,-.25,-2.8,-5.625,-.25,-2.8],
// 4 15 -5.625 -.25 -2.8 -5.31 -.25 -3.84 -4.77 -.25 -3.6 -4.41 -.25 -3.24
  [4,15,-5.625,-.25,-2.8,-5.31,-.25,-3.84,-4.77,-.25,-3.6,-4.41,-.25,-3.24],
// 3 15 -7.515 -.25 1 -5.85 -.25 -2.2 -4.23 -.25 -2.36
  [3,15,-7.515,-.25,1,-5.85,-.25,-2.2,-4.23,-.25,-2.36],
// 4 15 -4.23 -.25 -2.36 -4.41 -.25 -1.8 -7.695 -.25 1.56 -7.515 -.25 1
  [4,15,-4.23,-.25,-2.36,-4.41,-.25,-1.8,-7.695,-.25,1.56,-7.515,-.25,1],
// 3 15 -4.41 -.25 -1.8 -6.075 -.25 1.4 -7.695 -.25 1.56
  [3,15,-4.41,-.25,-1.8,-6.075,-.25,1.4,-7.695,-.25,1.56],
// 4 15 -4.275 -.25 2 -4.41 -.25 2.44 -5.31 -.25 3.04 -5.9625 -.25 3.12
  [4,15,-4.275,-.25,2,-4.41,-.25,2.44,-5.31,-.25,3.04,-5.9625,-.25,3.12],
// 3 15 -4.77 -.25 2.8 -5.31 -.25 3.04 -4.41 -.25 2.44
  [3,15,-4.77,-.25,2.8,-5.31,-.25,3.04,-4.41,-.25,2.44],
// 4 15 -5.85 -.25 -2.2 -5.625 -.25 -2.8 -4.185 -.25 -2.8 -4.23 -.25 -2.36
  [4,15,-5.85,-.25,-2.2,-5.625,-.25,-2.8,-4.185,-.25,-2.8,-4.23,-.25,-2.36],
// 4 15 -5.9625 -.25 2.2 -5.9625 -.25 3.12 -7.155 -.25 2.8 -6.165 -.25 2.16
  [4,15,-5.9625,-.25,2.2,-5.9625,-.25,3.12,-7.155,-.25,2.8,-6.165,-.25,2.16],
// 4 15 -5.625 -.25 -2.8 -5.76 -.25 -2.96 -5.9625 -.25 -3.92 -5.31 -.25 -3.84
  [4,15,-5.625,-.25,-2.8,-5.76,-.25,-2.96,-5.9625,-.25,-3.92,-5.31,-.25,-3.84],
// 4 15 -5.76 -.25 -2.96 -5.9625 -.25 -3 -6.615 -.25 -3.84 -5.9625 -.25 -3.92
  [4,15,-5.76,-.25,-2.96,-5.9625,-.25,-3,-6.615,-.25,-3.84,-5.9625,-.25,-3.92],
// 4 15 -6.075 -.25 1.4 -6.3 -.25 2 -7.74 -.25 2 -7.695 -.25 1.56
  [4,15,-6.075,-.25,1.4,-6.3,-.25,2,-7.74,-.25,2,-7.695,-.25,1.56],
// 4 15 -7.65 -.25 -2.8 -6.3 -.25 -2.8 -6.3 -.25 -2 -7.65 -.25 -2
  [4,15,-7.65,-.25,-2.8,-6.3,-.25,-2.8,-6.3,-.25,-2,-7.65,-.25,-2],
// 4 15 -7.155 -.25 -3.6 -6.165 -.25 -2.96 -6.3 -.25 -2.8 -7.515 -.25 -3.24
  [4,15,-7.155,-.25,-3.6,-6.165,-.25,-2.96,-6.3,-.25,-2.8,-7.515,-.25,-3.24],
// 3 15 -7.65 -.25 -2.8 -7.515 -.25 -3.24 -6.3 -.25 -2.8
  [3,15,-7.65,-.25,-2.8,-7.515,-.25,-3.24,-6.3,-.25,-2.8],
// 4 15 -7.155 -.25 -3.6 -6.615 -.25 -3.84 -5.9625 -.25 -3 -6.165 -.25 -2.96
  [4,15,-7.155,-.25,-3.6,-6.615,-.25,-3.84,-5.9625,-.25,-3,-6.165,-.25,-2.96],
// 3 15 -7.155 -.25 2.8 -5.9625 -.25 3.12 -6.615 -.25 3.04
  [3,15,-7.155,-.25,2.8,-5.9625,-.25,3.12,-6.615,-.25,3.04],
// 4 15 -7.155 -.25 2.8 -7.515 -.25 2.44 -6.3 -.25 2 -6.165 -.25 2.16
  [4,15,-7.155,-.25,2.8,-7.515,-.25,2.44,-6.3,-.25,2,-6.165,-.25,2.16],
// 3 15 -7.515 -.25 2.44 -7.74 -.25 2 -6.3 -.25 2
  [3,15,-7.515,-.25,2.44,-7.74,-.25,2,-6.3,-.25,2],
// 4 15 -8.55 -.25 2 -8.55 -.25 3.04 -11.25 -.25 3.04 -9.9 -.25 2
  [4,15,-8.55,-.25,2,-8.55,-.25,3.04,-11.25,-.25,3.04,-9.9,-.25,2],
// 4 15 -11.25 -.25 -3.84 -8.55 -.25 -3.84 -8.55 -.25 -2.8 -9.9 -.25 -2.8
  [4,15,-11.25,-.25,-3.84,-8.55,-.25,-3.84,-8.55,-.25,-2.8,-9.9,-.25,-2.8],
// 4 15 -9.9 -.25 -.8 -8.775 -.25 -.8 -8.775 -.25 .2 -9.9 -.25 .2
  [4,15,-9.9,-.25,-.8,-8.775,-.25,-.8,-8.775,-.25,.2,-9.9,-.25,.2],
// 4 15 1.71 -.25 2 2.61 -.25 3.04 .225 -.25 3.04 1.575 -.25 2
  [4,15,1.71,-.25,2,2.61,-.25,3.04,.225,-.25,3.04,1.575,-.25,2],
// 3 15 .225 -.25 3.04 1.575 -.25 .2 1.575 -.25 2
  [3,15,.225,-.25,3.04,1.575,-.25,.2,1.575,-.25,2],
// 3 15 1.575 -.25 -.8 .225 -.25 -3.84 1.575 -.25 -3.84
  [3,15,1.575,-.25,-.8,.225,-.25,-3.84,1.575,-.25,-3.84],
// 4 15 .225 -.25 3.04 .225 -.25 -3.84 1.575 -.25 -.8 1.575 -.25 .2
  [4,15,.225,-.25,3.04,.225,-.25,-3.84,1.575,-.25,-.8,1.575,-.25,.2],
// 4 15 9 -.25 3.04 9 -.25 -3.84 10.35 -.25 .2 10.35 -.25 2
  [4,15,9,-.25,3.04,9,-.25,-3.84,10.35,-.25,.2,10.35,-.25,2],
// 3 15 10.35 -.25 -.8 10.35 -.25 .2 9 -.25 -3.84
  [3,15,10.35,-.25,-.8,10.35,-.25,.2,9,-.25,-3.84],
// 3 15 10.35 -.25 -2.8 10.35 -.25 -.8 9 -.25 -3.84
  [3,15,10.35,-.25,-2.8,10.35,-.25,-.8,9,-.25,-3.84],
// 4 15 10.35 -.25 -.8 11.475 -.25 -.8 11.475 -.25 .2 10.35 -.25 .2
  [4,15,10.35,-.25,-.8,11.475,-.25,-.8,11.475,-.25,.2,10.35,-.25,.2],
// 4 15 9 -.25 3.04 10.35 -.25 2 11.7 -.25 2 11.7 -.25 3.04
  [4,15,9,-.25,3.04,10.35,-.25,2,11.7,-.25,2,11.7,-.25,3.04],
// 4 15 9 -.25 -3.84 11.7 -.25 -3.84 11.7 -.25 -2.8 10.35 -.25 -2.8
  [4,15,9,-.25,-3.84,11.7,-.25,-3.84,11.7,-.25,-2.8,10.35,-.25,-2.8],
// 4 15 12.6 -.25 -3.84 13.95 -.25 -2.8 13.95 -.25 2 12.6 -.25 3.04
  [4,15,12.6,-.25,-3.84,13.95,-.25,-2.8,13.95,-.25,2,12.6,-.25,3.04],
// 4 15 14.175 -.25 -2.8 13.95 -.25 -2.8 12.6 -.25 -3.84 14.85 -.25 -3.84
  [4,15,14.175,-.25,-2.8,13.95,-.25,-2.8,12.6,-.25,-3.84,14.85,-.25,-3.84],
// 4 15 15.975 -.25 -2.6 15.975 -.25 1.8 14.625 -.25 1.8 14.625 -.25 -2.6
  [4,15,15.975,-.25,-2.6,15.975,-.25,1.8,14.625,-.25,1.8,14.625,-.25,-2.6],
// 3 15 15.3 -.25 2.96 14.85 -.25 3.04 14.175 -.25 2
  [3,15,15.3,-.25,2.96,14.85,-.25,3.04,14.175,-.25,2],
// 3 15 15.75 -.25 2.64 15.3 -.25 2.96 14.175 -.25 2
  [3,15,15.75,-.25,2.64,15.3,-.25,2.96,14.175,-.25,2],
// 4 15 14.175 -.25 2 14.49 -.25 1.92 15.93 -.25 2.2 15.75 -.25 2.64
  [4,15,14.175,-.25,2,14.49,-.25,1.92,15.93,-.25,2.2,15.75,-.25,2.64],
// 4 15 14.625 -.25 1.8 15.975 -.25 1.8 15.93 -.25 2.2 14.49 -.25 1.92
  [4,15,14.625,-.25,1.8,15.975,-.25,1.8,15.93,-.25,2.2,14.49,-.25,1.92],
// 4 15 12.6 -.25 3.04 13.95 -.25 2 14.175 -.25 2 14.85 -.25 3.04
  [4,15,12.6,-.25,3.04,13.95,-.25,2,14.175,-.25,2,14.85,-.25,3.04],
// 4 15 15.3 -.25 -3.76 14.49 -.25 -2.72 14.175 -.25 -2.8 14.85 -.25 -3.84
  [4,15,15.3,-.25,-3.76,14.49,-.25,-2.72,14.175,-.25,-2.8,14.85,-.25,-3.84],
// 3 15 15.93 -.25 -3 15.975 -.25 -2.6 14.625 -.25 -2.6
  [3,15,15.93,-.25,-3,15.975,-.25,-2.6,14.625,-.25,-2.6],
// 3 15 15.75 -.25 -3.36 15.93 -.25 -3 14.625 -.25 -2.6
  [3,15,15.75,-.25,-3.36,15.93,-.25,-3,14.625,-.25,-2.6],
// 4 15 14.625 -.25 -2.6 14.49 -.25 -2.72 15.3 -.25 -3.76 15.75 -.25 -3.36
  [4,15,14.625,-.25,-2.6,14.49,-.25,-2.72,15.3,-.25,-3.76,15.75,-.25,-3.36],
// 4 15 1.575 -.25 -.8 1.8 -.25 -.8 1.71 -.25 .2 1.575 -.25 .2
  [4,15,1.575,-.25,-.8,1.8,-.25,-.8,1.71,-.25,.2,1.575,-.25,.2],
// 3 15 1.935 -.25 .28 1.71 -.25 .2 1.8 -.25 -.8
  [3,15,1.935,-.25,.28,1.71,-.25,.2,1.8,-.25,-.8],
// 4 15 1.8 -.25 -.8 3.15 -.25 -.6 2.025 -.25 .4 1.935 -.25 .28
  [4,15,1.8,-.25,-.8,3.15,-.25,-.6,2.025,-.25,.4,1.935,-.25,.28],
// 4 15 3.06 -.25 2.96 1.935 -.25 1.92 2.025 -.25 1.8 3.375 -.25 2.64
  [4,15,3.06,-.25,2.96,1.935,-.25,1.92,2.025,-.25,1.8,3.375,-.25,2.64],
// 4 15 1.935 -.25 1.92 3.06 -.25 2.96 2.61 -.25 3.04 1.71 -.25 2
  [4,15,1.935,-.25,1.92,3.06,-.25,2.96,2.61,-.25,3.04,1.71,-.25,2],
// 4 15 2.475 -.25 -3.84 4.05 -.25 -3.84 3.15 -.25 -.6 1.8 -.25 -.8
  [4,15,2.475,-.25,-3.84,4.05,-.25,-3.84,3.15,-.25,-.6,1.8,-.25,-.8],
// 3 15 3.51 -.25 -.2 3.6 -.25 .2 2.025 -.25 1.8
  [3,15,3.51,-.25,-.2,3.6,-.25,.2,2.025,-.25,1.8],
// 3 15 3.33 -.25 -.48 3.51 -.25 -.2 2.025 -.25 1.8
  [3,15,3.33,-.25,-.48,3.51,-.25,-.2,2.025,-.25,1.8],
// 4 15 2.025 -.25 1.8 2.025 -.25 .4 3.15 -.25 -.6 3.33 -.25 -.48
  [4,15,2.025,-.25,1.8,2.025,-.25,.4,3.15,-.25,-.6,3.33,-.25,-.48],
// 3 15 3.555 -.25 2.2 3.375 -.25 2.64 2.025 -.25 1.8
  [3,15,3.555,-.25,2.2,3.375,-.25,2.64,2.025,-.25,1.8],
// 4 15 2.025 -.25 1.8 3.6 -.25 .2 3.6 -.25 1.8 3.555 -.25 2.2
  [4,15,2.025,-.25,1.8,3.6,-.25,.2,3.6,-.25,1.8,3.555,-.25,2.2],
// 4 15 5.4 -.25 -3.84 6.21 -.25 -.8 5.67 -.25 3.04 4.32 -.25 3.04
  [4,15,5.4,-.25,-3.84,6.21,-.25,-.8,5.67,-.25,3.04,4.32,-.25,3.04],
// 4 15 7.02 -.25 -3.84 8.1 -.25 3.04 6.75 -.25 3.04 6.21 -.25 -.8
  [4,15,7.02,-.25,-3.84,8.1,-.25,3.04,6.75,-.25,3.04,6.21,-.25,-.8],
// 3 15 7.02 -.25 -3.84 6.21 -.25 -.8 5.4 -.25 -3.84
  [3,15,7.02,-.25,-3.84,6.21,-.25,-.8,5.4,-.25,-3.84],
];
module ldraw_lib__6288456d(step=0, col=false, unit=2/5, alt=false, line=0.2, solid=!$preview)
    makepoly(ldraw_lib__6288456d(), step=step, col=col, unit=unit, alt=alt, line=line, solid=solid);
ldraw_lib__6288456d(line=0.2);
